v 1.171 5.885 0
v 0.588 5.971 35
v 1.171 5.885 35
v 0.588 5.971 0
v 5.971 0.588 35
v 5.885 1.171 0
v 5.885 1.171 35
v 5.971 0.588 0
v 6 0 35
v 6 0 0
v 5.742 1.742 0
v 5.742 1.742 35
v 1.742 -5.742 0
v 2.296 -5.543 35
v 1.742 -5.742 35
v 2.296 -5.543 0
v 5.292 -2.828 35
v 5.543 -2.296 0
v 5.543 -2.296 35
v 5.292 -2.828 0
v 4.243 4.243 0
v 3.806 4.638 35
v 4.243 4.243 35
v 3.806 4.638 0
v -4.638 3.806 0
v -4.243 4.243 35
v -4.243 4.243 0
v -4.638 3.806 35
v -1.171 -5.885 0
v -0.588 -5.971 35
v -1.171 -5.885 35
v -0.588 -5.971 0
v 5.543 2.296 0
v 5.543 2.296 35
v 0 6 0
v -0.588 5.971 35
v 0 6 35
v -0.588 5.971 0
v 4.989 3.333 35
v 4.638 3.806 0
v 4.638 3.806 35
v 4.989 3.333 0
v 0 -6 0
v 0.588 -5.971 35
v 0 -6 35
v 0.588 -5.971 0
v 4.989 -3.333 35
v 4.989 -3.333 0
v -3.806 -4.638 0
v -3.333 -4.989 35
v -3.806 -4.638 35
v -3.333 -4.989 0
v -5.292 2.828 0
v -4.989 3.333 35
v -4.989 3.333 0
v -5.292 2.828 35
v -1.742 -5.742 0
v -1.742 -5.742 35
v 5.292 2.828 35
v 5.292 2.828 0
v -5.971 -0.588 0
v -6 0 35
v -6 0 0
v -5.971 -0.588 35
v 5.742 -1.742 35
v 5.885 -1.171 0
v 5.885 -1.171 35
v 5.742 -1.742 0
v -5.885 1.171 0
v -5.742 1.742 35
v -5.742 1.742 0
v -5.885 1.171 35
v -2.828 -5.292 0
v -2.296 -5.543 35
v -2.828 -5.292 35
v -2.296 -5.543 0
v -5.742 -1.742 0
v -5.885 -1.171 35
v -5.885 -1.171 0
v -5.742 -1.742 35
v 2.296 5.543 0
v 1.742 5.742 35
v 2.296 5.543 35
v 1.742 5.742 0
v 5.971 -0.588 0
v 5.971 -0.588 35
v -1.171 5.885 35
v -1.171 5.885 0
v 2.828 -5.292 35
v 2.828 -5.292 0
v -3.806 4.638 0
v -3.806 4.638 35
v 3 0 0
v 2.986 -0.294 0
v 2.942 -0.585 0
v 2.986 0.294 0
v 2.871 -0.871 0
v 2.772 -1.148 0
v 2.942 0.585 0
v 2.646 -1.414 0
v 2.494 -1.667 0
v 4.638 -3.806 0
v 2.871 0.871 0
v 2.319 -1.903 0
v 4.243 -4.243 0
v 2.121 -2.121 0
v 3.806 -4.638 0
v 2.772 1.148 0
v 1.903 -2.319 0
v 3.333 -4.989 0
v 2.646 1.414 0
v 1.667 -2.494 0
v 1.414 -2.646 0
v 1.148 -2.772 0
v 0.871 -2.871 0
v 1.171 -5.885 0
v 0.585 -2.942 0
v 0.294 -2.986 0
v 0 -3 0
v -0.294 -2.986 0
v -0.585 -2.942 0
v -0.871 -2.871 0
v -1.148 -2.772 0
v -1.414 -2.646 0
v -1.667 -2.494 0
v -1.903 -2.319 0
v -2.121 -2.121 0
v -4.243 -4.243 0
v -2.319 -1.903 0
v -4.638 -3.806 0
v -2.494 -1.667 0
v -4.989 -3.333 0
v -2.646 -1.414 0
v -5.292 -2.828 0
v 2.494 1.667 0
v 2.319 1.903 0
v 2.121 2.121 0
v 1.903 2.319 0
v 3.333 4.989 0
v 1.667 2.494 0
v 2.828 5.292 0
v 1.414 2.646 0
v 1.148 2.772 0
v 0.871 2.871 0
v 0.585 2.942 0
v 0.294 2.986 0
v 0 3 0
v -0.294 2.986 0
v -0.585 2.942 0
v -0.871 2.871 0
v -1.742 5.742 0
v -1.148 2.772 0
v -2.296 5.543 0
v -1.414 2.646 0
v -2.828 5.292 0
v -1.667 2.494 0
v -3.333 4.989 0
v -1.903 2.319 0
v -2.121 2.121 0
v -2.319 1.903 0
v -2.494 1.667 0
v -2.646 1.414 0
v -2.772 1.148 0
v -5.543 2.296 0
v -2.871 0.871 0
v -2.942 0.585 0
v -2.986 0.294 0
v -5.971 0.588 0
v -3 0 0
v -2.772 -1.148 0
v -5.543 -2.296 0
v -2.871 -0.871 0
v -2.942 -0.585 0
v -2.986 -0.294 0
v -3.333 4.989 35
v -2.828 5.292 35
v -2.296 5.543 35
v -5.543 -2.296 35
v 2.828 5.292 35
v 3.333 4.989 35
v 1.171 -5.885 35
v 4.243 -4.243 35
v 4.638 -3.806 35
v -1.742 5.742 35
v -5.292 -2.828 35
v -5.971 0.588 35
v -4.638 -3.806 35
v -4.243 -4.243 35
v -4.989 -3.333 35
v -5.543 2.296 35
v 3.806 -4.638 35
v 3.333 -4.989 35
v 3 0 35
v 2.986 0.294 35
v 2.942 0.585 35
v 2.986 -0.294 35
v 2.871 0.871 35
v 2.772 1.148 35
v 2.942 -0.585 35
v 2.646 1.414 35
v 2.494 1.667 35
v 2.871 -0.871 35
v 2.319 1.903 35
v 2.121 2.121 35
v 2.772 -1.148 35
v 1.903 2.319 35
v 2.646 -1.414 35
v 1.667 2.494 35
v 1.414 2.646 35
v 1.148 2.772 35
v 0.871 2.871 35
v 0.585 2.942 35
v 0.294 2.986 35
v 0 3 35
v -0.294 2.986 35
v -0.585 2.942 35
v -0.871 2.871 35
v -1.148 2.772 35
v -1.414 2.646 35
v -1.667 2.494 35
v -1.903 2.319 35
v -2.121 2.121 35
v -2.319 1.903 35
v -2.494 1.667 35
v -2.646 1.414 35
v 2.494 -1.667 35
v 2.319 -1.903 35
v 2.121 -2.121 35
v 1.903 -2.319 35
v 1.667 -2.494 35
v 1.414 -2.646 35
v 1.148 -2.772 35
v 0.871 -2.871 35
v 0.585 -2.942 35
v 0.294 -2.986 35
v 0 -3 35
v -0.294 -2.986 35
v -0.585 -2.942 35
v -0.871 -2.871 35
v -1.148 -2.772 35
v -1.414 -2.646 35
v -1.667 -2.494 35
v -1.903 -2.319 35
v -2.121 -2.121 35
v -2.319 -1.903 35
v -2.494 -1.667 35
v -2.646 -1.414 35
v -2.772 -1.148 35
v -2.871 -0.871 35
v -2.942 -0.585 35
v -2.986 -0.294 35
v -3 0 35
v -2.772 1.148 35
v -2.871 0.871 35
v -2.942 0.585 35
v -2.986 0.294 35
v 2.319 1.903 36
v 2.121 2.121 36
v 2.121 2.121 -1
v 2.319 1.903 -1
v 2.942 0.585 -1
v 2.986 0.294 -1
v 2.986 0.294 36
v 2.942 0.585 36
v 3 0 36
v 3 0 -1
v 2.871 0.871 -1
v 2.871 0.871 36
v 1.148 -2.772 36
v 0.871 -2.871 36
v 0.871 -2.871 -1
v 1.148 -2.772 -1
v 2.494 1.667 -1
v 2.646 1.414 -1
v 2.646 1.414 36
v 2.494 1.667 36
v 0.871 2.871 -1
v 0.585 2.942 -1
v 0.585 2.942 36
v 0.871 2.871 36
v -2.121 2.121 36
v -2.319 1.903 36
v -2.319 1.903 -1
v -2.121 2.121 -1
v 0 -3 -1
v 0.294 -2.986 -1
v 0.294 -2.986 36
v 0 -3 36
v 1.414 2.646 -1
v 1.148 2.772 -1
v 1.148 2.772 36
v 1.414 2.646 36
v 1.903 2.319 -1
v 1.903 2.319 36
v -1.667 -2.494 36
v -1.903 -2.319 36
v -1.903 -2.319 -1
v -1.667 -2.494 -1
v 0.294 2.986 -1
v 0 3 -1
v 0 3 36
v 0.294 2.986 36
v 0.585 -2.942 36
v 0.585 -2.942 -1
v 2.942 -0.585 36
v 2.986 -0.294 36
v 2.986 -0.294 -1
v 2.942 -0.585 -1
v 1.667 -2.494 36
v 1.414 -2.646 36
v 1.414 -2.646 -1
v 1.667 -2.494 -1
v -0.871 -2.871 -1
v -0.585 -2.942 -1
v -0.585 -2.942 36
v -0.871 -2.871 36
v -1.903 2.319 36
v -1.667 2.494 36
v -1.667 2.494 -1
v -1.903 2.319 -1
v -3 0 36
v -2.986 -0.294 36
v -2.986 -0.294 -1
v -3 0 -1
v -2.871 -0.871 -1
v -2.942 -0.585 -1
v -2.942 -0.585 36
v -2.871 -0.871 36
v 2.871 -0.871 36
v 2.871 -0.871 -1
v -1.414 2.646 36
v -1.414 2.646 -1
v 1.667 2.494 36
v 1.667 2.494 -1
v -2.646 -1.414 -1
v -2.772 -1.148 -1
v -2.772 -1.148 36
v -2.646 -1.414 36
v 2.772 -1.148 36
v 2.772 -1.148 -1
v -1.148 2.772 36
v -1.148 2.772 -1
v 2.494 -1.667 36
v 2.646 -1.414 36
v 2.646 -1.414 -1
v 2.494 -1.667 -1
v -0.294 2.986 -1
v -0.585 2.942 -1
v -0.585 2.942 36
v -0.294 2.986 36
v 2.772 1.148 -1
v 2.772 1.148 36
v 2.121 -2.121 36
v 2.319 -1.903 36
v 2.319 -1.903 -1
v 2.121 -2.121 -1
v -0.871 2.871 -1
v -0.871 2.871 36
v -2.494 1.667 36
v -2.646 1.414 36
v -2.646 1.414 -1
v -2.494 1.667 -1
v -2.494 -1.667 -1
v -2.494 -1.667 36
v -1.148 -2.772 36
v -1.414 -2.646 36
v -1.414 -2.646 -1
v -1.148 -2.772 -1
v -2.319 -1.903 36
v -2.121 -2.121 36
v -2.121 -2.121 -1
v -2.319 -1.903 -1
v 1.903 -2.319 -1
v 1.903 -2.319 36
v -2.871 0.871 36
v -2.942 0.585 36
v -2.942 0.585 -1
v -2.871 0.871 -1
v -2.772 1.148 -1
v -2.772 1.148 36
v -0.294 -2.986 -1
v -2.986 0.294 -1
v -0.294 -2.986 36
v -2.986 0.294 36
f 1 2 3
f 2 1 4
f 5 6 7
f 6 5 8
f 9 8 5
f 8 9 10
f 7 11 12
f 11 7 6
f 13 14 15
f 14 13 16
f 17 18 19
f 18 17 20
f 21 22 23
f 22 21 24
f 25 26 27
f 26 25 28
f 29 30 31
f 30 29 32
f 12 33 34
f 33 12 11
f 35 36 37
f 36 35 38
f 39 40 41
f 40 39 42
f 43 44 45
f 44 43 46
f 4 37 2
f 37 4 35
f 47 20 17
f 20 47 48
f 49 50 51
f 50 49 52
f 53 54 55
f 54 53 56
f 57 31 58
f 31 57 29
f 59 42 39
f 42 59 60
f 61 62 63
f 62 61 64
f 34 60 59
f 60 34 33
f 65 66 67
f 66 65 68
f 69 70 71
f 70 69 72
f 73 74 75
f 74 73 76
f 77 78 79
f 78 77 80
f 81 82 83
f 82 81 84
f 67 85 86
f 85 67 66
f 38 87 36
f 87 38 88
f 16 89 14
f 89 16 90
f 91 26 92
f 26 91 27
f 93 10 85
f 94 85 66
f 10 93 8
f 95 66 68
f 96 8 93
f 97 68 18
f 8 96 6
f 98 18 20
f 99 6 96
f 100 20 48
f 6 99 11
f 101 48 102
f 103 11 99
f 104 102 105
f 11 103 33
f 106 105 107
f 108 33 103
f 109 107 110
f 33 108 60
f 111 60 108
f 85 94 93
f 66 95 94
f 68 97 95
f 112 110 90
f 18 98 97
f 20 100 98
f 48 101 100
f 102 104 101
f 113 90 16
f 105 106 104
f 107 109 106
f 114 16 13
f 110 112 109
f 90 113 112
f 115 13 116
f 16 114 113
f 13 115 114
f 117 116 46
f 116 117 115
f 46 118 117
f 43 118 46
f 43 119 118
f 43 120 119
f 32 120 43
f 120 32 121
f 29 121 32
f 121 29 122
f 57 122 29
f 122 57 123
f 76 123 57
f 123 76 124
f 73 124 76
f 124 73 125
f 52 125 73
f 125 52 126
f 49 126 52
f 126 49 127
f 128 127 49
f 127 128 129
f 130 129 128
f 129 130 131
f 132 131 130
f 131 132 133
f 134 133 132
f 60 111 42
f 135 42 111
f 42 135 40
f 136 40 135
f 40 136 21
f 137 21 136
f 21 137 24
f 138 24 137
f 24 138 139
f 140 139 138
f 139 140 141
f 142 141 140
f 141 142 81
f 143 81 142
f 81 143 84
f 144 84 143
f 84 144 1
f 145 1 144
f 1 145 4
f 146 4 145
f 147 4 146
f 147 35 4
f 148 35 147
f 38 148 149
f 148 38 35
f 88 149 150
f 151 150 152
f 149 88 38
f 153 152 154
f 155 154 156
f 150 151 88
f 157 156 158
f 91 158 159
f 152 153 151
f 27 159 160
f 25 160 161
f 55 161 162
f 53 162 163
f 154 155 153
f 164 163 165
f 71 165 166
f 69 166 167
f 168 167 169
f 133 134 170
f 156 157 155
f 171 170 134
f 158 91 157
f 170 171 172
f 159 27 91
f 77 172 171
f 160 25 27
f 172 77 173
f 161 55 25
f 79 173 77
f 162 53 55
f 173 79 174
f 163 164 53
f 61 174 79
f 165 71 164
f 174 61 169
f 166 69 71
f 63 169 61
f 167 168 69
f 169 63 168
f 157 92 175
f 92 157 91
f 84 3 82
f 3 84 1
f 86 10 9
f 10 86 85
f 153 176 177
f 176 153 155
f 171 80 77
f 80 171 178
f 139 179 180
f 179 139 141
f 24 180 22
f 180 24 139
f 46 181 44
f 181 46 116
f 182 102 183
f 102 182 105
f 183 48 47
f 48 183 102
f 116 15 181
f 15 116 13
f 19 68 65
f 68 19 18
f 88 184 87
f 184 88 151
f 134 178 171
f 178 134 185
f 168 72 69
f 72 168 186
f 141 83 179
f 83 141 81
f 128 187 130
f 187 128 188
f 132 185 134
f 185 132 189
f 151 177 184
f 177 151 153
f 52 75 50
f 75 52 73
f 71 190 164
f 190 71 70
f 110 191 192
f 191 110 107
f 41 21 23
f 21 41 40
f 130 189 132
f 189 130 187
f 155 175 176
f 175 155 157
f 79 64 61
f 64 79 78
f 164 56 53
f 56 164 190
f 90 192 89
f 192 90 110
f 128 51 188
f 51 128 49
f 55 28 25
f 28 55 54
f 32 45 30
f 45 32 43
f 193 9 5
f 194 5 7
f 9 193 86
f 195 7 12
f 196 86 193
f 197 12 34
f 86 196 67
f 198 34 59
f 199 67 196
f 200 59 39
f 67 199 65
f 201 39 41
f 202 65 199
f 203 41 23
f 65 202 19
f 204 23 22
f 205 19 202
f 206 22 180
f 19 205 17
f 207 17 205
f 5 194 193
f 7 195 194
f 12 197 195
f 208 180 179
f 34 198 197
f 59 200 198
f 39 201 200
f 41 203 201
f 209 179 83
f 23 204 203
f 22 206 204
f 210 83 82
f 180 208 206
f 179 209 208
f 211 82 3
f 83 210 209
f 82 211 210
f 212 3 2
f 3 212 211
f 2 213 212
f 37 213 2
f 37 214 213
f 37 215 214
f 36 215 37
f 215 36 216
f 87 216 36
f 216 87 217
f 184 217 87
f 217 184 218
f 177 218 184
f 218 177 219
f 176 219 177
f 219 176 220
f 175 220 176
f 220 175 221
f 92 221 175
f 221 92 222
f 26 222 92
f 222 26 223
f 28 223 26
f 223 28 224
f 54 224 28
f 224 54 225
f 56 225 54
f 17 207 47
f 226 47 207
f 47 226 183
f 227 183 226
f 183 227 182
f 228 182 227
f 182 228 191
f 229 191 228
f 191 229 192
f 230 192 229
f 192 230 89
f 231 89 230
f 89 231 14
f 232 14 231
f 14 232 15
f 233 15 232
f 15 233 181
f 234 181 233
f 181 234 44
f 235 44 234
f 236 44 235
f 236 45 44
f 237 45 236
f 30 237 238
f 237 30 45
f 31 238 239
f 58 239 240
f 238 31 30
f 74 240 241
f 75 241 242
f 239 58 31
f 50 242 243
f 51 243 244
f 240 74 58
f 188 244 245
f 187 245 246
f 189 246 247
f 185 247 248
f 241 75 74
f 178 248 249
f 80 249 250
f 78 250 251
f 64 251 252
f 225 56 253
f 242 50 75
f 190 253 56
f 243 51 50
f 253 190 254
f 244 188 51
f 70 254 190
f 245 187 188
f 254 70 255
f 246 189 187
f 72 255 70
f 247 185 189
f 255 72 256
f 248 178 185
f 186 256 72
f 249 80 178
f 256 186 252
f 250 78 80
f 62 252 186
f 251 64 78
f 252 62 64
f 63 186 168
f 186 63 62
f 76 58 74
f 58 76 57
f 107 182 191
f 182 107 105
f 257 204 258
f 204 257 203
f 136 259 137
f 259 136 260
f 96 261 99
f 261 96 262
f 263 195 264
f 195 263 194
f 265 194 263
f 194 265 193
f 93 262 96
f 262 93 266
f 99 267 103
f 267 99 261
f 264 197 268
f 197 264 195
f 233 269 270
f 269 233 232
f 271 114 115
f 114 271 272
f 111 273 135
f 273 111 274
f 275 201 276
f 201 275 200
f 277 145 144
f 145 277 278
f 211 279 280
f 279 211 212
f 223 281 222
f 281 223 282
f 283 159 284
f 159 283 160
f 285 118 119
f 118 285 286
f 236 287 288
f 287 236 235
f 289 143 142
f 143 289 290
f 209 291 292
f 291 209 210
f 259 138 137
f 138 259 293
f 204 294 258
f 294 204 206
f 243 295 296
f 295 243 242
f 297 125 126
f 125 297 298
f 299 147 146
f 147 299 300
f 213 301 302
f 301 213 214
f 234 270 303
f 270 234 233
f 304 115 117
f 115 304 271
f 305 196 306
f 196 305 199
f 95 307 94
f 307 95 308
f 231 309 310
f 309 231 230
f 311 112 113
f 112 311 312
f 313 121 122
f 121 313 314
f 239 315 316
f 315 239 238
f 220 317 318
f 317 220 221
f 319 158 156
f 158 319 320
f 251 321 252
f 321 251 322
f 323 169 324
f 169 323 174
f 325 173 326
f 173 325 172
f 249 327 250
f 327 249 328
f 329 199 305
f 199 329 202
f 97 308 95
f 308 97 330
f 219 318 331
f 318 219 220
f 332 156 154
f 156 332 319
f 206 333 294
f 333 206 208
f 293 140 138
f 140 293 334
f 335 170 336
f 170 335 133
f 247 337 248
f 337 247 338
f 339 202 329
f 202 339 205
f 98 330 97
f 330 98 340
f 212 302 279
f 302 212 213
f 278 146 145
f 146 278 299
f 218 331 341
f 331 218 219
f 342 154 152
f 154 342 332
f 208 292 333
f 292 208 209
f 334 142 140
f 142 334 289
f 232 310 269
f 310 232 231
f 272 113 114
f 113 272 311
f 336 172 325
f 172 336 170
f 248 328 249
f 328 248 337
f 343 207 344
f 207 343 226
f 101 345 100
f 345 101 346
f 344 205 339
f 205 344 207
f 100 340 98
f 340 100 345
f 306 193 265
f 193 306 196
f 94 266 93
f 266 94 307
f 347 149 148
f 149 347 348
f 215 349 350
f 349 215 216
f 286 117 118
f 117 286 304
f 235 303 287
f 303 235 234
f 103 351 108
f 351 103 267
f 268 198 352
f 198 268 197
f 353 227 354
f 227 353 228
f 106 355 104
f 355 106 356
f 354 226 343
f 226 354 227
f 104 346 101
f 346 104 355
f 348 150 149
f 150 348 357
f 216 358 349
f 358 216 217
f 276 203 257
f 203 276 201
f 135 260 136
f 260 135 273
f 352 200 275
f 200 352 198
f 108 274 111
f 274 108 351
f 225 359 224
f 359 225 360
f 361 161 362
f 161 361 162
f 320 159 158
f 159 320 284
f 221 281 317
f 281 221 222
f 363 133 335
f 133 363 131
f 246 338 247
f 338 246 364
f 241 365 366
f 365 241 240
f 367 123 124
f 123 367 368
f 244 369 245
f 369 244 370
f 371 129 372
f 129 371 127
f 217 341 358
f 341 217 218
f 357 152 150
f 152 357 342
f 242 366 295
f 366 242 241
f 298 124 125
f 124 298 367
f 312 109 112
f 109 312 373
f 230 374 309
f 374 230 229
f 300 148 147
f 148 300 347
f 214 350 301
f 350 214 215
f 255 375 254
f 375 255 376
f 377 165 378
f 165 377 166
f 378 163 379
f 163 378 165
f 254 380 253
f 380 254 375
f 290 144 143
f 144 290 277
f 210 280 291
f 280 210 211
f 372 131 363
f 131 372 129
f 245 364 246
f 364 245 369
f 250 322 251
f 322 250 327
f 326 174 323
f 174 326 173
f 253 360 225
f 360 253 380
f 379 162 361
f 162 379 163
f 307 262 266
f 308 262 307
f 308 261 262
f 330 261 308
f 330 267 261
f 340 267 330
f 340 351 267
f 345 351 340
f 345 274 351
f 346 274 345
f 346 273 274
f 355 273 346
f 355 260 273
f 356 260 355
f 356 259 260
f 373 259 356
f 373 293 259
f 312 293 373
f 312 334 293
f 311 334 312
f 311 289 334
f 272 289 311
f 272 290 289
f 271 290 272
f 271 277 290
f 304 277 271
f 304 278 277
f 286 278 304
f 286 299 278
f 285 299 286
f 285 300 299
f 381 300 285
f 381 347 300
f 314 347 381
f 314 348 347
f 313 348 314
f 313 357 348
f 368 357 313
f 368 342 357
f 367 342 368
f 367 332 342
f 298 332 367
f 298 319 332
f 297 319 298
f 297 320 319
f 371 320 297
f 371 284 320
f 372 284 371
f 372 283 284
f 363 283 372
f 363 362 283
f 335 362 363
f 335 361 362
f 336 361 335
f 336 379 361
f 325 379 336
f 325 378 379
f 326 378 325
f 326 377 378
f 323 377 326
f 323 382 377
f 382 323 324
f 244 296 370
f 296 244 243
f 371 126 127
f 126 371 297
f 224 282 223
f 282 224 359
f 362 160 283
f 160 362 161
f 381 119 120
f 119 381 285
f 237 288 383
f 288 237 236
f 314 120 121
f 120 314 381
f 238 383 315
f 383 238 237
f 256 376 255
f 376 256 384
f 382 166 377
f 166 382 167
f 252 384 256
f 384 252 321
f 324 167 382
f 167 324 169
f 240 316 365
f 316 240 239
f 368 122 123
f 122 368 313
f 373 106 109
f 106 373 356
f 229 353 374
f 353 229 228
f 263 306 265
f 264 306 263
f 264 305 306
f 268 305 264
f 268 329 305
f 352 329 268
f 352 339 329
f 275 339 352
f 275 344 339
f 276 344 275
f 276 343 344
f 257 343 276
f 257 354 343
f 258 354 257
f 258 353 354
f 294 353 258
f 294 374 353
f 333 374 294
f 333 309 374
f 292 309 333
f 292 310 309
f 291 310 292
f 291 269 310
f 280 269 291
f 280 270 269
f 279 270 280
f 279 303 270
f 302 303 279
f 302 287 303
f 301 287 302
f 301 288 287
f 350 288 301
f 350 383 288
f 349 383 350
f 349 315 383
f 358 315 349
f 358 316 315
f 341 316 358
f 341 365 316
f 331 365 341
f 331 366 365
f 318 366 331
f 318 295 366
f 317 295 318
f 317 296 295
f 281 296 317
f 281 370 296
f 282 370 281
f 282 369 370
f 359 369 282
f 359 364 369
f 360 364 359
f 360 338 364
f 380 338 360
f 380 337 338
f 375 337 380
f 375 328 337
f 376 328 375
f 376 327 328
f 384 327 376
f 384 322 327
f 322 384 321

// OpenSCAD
cylinder(h=35.0, d=12.0, $fn=64);
translate([0, 0, -1])
cylinder(h=37.0, d=6.0, $fn=64);
